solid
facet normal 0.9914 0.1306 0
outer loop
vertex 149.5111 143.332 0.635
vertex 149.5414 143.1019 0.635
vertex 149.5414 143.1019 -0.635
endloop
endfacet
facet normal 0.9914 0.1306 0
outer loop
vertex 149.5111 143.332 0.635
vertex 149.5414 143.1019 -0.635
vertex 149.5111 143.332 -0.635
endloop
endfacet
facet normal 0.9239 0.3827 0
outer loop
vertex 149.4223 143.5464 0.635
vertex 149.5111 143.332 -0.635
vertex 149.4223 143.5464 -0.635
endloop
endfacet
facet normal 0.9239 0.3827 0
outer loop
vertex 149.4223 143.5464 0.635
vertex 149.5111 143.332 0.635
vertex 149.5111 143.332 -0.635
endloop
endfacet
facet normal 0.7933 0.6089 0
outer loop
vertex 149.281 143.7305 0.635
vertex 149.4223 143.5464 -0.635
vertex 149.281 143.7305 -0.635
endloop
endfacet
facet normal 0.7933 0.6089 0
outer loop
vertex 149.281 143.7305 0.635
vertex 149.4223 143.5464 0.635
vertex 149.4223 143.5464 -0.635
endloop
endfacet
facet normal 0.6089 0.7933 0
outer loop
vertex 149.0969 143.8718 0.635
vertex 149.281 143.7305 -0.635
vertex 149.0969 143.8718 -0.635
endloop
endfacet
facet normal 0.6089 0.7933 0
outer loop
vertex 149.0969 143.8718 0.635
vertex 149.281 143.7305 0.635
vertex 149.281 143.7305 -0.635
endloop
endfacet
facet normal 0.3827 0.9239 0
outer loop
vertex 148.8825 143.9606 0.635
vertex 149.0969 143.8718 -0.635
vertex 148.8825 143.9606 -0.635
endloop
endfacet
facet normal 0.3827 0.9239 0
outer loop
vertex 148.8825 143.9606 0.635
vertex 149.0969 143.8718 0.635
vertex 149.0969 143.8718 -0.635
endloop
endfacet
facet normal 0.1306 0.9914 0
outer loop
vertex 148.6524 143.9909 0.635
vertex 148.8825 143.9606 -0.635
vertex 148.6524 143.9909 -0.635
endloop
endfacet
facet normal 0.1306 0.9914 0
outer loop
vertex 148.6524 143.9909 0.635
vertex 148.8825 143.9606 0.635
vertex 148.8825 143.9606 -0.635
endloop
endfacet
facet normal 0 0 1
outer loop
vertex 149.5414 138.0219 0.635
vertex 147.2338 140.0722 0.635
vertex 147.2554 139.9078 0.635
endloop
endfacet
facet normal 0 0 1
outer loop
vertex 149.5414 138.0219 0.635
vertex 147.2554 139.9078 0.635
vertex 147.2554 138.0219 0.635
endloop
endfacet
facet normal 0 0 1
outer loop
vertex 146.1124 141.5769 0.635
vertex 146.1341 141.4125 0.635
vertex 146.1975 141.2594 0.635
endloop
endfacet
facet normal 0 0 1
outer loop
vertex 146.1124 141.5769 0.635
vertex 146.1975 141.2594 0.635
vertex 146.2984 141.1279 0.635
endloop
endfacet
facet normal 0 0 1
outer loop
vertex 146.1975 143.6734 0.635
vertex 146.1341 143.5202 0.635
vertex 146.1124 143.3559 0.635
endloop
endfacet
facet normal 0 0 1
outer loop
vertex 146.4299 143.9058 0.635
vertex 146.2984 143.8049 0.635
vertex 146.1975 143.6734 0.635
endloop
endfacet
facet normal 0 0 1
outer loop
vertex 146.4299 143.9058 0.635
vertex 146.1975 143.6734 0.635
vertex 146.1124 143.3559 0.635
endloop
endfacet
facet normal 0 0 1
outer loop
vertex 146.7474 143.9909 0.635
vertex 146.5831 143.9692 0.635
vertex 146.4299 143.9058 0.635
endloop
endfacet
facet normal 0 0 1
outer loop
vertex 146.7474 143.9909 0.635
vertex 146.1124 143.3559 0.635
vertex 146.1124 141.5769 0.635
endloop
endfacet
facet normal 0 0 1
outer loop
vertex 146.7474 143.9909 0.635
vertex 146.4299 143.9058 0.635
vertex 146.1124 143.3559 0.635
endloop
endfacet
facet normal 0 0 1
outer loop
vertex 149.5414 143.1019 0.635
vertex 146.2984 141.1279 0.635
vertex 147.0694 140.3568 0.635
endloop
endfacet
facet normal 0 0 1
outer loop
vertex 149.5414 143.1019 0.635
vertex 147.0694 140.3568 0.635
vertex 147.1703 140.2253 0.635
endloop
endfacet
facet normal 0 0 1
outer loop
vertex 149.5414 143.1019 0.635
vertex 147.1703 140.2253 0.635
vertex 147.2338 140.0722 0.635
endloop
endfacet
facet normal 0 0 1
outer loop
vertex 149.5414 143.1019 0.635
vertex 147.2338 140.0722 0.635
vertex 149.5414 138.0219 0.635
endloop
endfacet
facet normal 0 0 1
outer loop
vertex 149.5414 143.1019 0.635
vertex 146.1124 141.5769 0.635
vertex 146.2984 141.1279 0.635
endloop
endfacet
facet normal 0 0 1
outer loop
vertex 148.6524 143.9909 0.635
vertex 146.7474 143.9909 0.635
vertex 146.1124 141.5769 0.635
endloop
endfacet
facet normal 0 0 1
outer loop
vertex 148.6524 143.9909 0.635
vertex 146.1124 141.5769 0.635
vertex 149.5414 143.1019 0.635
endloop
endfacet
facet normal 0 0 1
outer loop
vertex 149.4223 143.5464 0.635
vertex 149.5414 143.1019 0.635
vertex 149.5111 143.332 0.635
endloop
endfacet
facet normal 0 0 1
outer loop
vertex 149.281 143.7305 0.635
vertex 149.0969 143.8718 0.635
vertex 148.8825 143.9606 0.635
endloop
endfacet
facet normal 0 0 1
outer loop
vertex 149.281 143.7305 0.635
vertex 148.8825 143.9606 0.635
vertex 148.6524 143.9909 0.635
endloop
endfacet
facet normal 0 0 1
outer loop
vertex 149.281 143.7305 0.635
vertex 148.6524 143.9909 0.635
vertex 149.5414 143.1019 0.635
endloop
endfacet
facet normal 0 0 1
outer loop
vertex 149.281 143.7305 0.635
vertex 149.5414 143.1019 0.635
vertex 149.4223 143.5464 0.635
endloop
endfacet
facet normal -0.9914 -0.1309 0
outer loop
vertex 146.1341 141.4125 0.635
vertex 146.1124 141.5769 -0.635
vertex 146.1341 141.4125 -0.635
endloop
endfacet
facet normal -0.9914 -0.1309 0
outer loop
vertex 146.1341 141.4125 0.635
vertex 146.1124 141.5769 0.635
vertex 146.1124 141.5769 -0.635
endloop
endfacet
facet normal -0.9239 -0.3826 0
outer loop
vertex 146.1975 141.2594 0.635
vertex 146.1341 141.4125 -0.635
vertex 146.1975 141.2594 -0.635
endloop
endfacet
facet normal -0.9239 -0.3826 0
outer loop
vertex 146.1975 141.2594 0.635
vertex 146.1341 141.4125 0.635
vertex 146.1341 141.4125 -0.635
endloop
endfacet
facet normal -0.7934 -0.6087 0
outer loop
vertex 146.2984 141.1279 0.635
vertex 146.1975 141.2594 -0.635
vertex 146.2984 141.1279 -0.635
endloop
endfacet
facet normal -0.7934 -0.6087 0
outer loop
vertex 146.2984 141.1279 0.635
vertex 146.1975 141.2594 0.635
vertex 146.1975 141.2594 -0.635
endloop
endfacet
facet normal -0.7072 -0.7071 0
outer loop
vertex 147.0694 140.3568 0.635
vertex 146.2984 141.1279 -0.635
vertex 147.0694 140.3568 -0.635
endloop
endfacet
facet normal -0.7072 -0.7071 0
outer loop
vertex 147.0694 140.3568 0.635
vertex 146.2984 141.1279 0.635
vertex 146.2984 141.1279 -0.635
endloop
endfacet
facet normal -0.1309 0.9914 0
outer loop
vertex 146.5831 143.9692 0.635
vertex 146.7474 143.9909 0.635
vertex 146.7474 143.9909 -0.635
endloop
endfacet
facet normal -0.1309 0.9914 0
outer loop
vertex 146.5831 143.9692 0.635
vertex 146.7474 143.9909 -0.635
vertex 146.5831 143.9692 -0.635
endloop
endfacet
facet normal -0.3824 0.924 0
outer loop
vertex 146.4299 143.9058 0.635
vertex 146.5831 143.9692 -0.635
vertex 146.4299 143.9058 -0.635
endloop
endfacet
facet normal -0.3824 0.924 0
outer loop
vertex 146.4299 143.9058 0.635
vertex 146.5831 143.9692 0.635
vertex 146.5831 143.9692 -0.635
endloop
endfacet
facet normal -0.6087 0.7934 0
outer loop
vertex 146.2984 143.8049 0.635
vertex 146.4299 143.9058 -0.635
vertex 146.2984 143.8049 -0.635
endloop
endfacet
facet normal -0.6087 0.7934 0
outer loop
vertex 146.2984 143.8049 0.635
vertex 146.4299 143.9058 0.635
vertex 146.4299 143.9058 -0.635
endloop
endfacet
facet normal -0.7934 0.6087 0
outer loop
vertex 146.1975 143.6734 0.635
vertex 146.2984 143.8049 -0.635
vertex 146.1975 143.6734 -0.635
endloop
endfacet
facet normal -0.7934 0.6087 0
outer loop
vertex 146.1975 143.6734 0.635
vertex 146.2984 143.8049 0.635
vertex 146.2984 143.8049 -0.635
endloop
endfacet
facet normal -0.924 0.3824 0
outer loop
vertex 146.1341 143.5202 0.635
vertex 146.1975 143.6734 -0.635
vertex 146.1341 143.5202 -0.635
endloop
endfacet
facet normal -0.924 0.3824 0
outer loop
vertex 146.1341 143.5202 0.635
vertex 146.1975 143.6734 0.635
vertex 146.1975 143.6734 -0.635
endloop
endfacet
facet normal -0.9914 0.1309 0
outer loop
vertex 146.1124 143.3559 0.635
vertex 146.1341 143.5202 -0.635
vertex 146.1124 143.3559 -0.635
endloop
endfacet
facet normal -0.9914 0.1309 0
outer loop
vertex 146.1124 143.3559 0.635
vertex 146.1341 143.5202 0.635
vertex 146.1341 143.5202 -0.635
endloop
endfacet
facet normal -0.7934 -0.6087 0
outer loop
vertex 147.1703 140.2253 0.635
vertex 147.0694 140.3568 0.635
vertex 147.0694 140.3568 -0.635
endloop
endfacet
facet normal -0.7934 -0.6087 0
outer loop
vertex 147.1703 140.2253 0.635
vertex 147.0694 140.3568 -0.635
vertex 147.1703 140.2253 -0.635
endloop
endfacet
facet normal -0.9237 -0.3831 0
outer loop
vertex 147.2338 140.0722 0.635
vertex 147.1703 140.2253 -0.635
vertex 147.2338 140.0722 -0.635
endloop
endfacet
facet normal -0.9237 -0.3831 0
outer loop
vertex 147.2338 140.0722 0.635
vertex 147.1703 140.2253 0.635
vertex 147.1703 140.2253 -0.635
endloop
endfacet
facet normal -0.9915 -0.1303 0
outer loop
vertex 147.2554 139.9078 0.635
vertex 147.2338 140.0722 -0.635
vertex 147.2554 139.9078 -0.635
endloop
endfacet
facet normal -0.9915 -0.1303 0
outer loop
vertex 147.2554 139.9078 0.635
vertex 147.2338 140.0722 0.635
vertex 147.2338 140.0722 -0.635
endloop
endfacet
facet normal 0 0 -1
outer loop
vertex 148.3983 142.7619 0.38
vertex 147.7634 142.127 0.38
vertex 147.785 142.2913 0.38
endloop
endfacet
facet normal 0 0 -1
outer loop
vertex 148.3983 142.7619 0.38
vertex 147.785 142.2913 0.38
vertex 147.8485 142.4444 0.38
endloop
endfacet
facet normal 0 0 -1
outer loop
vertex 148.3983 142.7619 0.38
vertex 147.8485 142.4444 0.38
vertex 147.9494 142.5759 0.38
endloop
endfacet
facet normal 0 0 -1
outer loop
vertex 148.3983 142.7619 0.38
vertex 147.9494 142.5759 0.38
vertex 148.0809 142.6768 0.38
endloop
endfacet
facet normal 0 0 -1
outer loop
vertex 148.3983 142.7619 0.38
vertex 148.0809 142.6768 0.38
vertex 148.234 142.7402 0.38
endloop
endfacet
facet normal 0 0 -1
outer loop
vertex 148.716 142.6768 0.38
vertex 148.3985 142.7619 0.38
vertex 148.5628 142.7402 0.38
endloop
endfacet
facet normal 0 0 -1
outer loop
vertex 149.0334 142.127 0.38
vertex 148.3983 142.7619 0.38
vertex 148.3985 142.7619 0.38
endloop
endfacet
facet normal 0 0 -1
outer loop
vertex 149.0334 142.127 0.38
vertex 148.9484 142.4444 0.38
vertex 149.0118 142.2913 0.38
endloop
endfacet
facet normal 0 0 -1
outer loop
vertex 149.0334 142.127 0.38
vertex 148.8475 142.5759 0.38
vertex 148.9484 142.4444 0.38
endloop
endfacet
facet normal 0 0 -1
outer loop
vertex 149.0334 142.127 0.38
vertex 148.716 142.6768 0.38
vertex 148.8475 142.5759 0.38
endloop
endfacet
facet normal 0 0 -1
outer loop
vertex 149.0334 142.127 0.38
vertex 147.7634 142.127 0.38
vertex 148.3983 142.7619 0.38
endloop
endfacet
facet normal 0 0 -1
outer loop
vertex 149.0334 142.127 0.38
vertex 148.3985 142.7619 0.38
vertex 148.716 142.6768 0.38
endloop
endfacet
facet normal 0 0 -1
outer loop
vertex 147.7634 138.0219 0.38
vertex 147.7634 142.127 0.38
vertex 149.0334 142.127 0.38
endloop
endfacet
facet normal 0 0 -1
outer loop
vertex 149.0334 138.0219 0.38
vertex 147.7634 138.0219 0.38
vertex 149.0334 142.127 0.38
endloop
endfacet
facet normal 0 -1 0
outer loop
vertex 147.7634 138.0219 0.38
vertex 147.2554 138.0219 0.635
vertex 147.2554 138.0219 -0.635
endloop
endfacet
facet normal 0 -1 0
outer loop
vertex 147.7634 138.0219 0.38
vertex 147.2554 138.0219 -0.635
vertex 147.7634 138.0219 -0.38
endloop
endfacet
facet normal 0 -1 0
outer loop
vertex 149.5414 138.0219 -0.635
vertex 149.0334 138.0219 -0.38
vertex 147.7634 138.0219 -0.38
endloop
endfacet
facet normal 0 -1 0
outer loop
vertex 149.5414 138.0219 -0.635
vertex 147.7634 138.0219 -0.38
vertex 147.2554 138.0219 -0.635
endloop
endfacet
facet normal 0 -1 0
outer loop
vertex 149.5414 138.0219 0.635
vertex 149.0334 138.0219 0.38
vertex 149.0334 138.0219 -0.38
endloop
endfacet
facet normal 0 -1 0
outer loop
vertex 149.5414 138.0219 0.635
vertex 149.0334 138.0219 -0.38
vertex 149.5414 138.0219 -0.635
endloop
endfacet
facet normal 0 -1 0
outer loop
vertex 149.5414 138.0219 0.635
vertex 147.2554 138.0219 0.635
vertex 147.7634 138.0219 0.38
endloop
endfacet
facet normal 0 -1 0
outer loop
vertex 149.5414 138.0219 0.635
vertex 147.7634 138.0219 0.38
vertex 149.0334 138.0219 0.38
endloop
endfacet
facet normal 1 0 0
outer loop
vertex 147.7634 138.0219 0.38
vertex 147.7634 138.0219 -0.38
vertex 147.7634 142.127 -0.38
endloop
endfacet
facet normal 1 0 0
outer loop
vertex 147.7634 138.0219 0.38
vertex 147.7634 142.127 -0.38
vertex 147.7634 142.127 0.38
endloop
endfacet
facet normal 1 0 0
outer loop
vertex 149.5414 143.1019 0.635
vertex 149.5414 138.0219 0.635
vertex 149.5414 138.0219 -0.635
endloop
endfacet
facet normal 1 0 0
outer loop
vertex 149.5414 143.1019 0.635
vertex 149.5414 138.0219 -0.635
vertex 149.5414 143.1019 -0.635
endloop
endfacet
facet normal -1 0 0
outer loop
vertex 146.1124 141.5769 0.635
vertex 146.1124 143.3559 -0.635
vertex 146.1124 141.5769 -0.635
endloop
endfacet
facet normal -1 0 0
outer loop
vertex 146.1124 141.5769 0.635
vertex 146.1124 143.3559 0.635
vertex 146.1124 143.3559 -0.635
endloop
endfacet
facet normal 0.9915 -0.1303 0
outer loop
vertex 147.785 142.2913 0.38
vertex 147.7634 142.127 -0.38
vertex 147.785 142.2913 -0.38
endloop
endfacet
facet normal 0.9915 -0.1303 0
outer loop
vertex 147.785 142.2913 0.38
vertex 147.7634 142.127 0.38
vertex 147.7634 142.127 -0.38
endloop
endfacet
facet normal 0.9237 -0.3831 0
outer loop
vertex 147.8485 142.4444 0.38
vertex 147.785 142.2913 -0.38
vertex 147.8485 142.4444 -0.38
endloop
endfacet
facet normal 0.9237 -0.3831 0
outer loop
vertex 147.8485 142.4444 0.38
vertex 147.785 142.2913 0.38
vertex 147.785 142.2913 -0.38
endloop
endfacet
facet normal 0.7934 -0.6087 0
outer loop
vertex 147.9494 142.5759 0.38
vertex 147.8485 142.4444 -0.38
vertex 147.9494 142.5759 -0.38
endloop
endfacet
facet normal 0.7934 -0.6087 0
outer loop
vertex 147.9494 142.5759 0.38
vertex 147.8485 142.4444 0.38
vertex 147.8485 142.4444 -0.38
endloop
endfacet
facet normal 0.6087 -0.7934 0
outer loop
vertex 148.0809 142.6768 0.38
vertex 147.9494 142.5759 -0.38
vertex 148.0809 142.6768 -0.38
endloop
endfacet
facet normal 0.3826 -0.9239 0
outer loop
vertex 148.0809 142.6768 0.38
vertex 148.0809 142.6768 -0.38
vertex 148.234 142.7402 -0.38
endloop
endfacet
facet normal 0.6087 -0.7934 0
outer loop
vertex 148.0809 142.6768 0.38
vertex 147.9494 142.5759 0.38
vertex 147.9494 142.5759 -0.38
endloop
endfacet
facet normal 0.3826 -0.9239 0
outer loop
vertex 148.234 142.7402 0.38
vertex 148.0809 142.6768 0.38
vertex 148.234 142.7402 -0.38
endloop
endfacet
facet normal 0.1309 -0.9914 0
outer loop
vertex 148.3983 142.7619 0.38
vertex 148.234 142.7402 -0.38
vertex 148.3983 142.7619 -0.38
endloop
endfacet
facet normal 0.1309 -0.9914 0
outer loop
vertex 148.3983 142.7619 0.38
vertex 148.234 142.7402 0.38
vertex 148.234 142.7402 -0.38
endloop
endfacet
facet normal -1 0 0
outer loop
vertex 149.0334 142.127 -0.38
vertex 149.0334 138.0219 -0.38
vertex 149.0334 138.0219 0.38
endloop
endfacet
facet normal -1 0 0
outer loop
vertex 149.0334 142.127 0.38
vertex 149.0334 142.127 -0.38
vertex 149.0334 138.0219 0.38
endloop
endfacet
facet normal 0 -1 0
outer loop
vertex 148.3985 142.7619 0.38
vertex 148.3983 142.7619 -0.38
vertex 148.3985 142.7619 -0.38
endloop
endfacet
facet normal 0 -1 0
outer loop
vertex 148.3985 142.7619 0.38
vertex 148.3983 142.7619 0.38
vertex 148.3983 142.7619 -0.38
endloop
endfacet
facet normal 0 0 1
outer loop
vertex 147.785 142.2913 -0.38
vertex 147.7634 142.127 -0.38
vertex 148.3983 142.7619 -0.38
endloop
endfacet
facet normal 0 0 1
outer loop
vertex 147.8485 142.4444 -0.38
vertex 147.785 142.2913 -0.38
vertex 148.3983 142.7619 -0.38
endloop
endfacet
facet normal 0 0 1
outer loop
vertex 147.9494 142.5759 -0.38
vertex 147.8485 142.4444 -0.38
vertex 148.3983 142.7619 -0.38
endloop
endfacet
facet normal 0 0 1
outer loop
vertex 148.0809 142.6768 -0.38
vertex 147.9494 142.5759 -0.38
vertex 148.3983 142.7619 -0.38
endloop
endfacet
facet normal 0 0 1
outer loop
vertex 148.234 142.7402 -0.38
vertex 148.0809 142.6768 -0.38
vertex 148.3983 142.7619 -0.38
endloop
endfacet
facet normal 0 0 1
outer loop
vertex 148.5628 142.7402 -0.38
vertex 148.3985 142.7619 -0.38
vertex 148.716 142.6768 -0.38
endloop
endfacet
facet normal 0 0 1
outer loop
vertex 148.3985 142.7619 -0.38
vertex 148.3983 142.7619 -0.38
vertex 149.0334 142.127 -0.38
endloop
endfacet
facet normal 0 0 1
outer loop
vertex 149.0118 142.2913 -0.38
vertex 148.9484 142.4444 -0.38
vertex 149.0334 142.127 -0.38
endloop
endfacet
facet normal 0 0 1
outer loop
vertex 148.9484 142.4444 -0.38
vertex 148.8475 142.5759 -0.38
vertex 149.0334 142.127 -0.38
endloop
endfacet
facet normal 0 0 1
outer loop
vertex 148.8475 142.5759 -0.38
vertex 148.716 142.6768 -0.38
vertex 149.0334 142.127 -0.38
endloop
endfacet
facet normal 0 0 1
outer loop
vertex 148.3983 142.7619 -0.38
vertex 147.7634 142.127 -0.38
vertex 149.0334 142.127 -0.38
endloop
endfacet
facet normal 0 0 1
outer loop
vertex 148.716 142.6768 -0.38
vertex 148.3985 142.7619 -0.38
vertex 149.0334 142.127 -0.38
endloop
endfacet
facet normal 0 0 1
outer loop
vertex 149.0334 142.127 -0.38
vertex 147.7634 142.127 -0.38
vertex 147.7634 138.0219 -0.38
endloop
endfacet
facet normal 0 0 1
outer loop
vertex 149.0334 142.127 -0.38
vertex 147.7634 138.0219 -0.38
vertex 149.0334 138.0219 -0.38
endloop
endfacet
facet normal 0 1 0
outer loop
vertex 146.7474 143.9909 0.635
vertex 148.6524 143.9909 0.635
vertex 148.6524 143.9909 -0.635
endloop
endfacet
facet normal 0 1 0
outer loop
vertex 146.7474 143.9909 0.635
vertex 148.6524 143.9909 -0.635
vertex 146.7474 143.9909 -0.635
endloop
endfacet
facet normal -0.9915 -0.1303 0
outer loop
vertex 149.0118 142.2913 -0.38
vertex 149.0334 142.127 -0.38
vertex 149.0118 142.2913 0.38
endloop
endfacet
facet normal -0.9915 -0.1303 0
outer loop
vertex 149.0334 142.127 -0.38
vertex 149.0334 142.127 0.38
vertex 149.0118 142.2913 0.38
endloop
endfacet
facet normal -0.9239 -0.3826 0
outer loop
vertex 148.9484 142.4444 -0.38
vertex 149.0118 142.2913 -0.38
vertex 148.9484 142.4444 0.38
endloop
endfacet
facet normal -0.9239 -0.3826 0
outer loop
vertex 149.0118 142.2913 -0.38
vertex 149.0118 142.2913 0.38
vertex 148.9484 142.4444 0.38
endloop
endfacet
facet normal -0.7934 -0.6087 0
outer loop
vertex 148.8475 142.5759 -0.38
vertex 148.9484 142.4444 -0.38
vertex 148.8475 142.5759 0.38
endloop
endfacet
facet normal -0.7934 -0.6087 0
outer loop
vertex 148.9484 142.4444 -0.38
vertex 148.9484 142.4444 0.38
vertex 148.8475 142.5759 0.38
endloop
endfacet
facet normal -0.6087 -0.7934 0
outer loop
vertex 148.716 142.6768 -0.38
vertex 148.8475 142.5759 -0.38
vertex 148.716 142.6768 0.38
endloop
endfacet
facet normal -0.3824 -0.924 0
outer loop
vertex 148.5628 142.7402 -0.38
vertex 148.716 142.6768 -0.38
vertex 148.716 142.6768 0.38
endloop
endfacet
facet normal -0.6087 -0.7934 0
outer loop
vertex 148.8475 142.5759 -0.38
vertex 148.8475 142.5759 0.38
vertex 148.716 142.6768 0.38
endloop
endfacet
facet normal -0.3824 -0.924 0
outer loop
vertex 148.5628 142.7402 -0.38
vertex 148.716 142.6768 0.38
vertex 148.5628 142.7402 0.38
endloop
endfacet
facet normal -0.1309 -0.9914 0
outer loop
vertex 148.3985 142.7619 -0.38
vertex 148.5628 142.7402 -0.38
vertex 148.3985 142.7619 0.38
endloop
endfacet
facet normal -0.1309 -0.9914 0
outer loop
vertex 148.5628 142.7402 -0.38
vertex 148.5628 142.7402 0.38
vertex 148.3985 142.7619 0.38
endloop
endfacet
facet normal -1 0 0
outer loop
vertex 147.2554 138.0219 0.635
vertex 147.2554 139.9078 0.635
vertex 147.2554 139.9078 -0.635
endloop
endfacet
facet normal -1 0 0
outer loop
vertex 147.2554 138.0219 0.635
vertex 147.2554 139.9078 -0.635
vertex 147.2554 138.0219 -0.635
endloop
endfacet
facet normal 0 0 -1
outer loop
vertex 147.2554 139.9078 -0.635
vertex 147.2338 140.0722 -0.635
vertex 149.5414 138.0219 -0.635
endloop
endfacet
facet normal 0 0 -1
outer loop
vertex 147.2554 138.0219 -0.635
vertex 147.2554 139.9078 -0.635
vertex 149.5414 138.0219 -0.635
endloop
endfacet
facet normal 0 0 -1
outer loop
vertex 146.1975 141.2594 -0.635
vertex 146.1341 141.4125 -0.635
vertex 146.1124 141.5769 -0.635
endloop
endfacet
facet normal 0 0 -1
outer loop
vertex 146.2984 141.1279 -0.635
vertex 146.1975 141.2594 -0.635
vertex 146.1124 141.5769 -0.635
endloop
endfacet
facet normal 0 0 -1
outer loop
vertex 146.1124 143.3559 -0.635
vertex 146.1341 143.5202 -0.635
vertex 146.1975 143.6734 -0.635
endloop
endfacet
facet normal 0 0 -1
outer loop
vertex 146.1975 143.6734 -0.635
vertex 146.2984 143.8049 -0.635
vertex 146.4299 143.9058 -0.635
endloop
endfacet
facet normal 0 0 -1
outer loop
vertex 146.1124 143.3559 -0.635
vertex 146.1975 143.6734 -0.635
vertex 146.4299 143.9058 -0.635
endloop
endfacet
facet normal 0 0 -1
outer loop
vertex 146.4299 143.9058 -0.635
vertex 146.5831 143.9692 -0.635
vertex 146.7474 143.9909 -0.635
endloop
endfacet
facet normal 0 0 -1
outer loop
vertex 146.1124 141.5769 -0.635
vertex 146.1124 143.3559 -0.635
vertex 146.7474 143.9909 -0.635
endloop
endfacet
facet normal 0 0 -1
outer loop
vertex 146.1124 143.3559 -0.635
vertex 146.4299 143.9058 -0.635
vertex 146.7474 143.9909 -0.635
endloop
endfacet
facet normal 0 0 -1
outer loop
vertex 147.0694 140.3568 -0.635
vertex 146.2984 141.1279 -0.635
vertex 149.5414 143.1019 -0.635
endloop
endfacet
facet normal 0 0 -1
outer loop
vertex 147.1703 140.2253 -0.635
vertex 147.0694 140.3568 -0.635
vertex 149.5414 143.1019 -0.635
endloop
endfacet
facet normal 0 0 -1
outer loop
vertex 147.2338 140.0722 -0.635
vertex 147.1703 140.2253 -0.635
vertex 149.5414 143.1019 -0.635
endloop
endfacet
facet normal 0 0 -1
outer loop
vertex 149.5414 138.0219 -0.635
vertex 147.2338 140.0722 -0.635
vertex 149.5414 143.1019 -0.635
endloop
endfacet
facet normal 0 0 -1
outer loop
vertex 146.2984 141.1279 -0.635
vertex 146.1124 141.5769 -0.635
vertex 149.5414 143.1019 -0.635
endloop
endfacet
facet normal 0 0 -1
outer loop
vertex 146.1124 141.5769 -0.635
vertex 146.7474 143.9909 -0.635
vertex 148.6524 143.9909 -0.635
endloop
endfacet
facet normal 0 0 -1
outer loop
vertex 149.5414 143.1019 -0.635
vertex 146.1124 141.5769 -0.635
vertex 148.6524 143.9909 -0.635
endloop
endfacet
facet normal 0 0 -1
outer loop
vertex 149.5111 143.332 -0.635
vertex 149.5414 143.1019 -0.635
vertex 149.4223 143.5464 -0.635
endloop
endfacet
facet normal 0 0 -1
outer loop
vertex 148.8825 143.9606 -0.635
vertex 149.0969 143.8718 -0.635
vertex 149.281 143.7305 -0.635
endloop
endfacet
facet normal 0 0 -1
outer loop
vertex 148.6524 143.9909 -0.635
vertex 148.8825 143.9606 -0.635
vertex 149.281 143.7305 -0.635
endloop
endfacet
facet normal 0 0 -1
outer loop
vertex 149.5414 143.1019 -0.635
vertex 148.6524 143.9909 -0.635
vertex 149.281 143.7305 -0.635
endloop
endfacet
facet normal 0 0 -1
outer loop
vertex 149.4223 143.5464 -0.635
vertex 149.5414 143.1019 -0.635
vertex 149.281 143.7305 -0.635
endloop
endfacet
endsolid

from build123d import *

# Parameters (mm, degrees)
BOSS_EXTRUDE1_DEPTH = 0.635
SKETCH2_W           = 1.27
SKETCH2_H           = 0.76
CUT_EXTRUDE1_DEPTH  = 4.74
FILLET1_R           = 0.635


with BuildPart() as part:
    # Sketch1 → Boss-Extrude1 (new, symmetric)
    with BuildSketch(Plane.XY):
        with BuildLine():
            Line((146.298402351, 141.127858501), (147.069427963, 140.356832889))
            ThreePointArc((147.069427963, 140.356832889), (147.20707866, 140.150824062), (147.255415157, 139.907820083))
            Line((147.255415157, 139.907820083), (147.255415157, 138.021869168))
            Line((147.255415157, 138.021869168), (149.541415157, 138.021869168))
            Line((149.541415157, 138.021869168), (149.541415157, 143.101869168))
            ThreePointArc((149.541415157, 143.101869168), (149.281033086, 143.730487097), (148.652415157, 143.990869168))
            Line((148.652415157, 143.990869168), (146.747415157, 143.990869168))
            ThreePointArc((146.747415157, 143.990869168), (146.298402351, 143.804881974), (146.112415157, 143.355869168))
            Line((146.112415157, 143.355869168), (146.112415157, 141.576871307))
            ThreePointArc((146.112415157, 141.576871307), (146.160751654, 141.333867327), (146.298402351, 141.127858501))
        make_face()
    extrude(amount=BOSS_EXTRUDE1_DEPTH, both=True)

    # Sketch2 → Cut-Extrude1 (cut)
    with BuildSketch(Plane.XZ.offset(-138.021869168)):
        with Locations((148.398415157, 0)):
            Rectangle(SKETCH2_W, SKETCH2_H)
    extrude(amount=-CUT_EXTRUDE1_DEPTH, mode=Mode.SUBTRACT)

    # Fillet1
    fillet1_edges = [part.edges().sort_by_distance(p)[0] for p in [
        (147.763415157, 142.761869168, 0),
        (149.033415157, 142.761869168, 0),
    ]]
    fillet(fillet1_edges, radius=FILLET1_R - 0.0001)  # a hair under: the kernel refuses the full size


solid = part.part
